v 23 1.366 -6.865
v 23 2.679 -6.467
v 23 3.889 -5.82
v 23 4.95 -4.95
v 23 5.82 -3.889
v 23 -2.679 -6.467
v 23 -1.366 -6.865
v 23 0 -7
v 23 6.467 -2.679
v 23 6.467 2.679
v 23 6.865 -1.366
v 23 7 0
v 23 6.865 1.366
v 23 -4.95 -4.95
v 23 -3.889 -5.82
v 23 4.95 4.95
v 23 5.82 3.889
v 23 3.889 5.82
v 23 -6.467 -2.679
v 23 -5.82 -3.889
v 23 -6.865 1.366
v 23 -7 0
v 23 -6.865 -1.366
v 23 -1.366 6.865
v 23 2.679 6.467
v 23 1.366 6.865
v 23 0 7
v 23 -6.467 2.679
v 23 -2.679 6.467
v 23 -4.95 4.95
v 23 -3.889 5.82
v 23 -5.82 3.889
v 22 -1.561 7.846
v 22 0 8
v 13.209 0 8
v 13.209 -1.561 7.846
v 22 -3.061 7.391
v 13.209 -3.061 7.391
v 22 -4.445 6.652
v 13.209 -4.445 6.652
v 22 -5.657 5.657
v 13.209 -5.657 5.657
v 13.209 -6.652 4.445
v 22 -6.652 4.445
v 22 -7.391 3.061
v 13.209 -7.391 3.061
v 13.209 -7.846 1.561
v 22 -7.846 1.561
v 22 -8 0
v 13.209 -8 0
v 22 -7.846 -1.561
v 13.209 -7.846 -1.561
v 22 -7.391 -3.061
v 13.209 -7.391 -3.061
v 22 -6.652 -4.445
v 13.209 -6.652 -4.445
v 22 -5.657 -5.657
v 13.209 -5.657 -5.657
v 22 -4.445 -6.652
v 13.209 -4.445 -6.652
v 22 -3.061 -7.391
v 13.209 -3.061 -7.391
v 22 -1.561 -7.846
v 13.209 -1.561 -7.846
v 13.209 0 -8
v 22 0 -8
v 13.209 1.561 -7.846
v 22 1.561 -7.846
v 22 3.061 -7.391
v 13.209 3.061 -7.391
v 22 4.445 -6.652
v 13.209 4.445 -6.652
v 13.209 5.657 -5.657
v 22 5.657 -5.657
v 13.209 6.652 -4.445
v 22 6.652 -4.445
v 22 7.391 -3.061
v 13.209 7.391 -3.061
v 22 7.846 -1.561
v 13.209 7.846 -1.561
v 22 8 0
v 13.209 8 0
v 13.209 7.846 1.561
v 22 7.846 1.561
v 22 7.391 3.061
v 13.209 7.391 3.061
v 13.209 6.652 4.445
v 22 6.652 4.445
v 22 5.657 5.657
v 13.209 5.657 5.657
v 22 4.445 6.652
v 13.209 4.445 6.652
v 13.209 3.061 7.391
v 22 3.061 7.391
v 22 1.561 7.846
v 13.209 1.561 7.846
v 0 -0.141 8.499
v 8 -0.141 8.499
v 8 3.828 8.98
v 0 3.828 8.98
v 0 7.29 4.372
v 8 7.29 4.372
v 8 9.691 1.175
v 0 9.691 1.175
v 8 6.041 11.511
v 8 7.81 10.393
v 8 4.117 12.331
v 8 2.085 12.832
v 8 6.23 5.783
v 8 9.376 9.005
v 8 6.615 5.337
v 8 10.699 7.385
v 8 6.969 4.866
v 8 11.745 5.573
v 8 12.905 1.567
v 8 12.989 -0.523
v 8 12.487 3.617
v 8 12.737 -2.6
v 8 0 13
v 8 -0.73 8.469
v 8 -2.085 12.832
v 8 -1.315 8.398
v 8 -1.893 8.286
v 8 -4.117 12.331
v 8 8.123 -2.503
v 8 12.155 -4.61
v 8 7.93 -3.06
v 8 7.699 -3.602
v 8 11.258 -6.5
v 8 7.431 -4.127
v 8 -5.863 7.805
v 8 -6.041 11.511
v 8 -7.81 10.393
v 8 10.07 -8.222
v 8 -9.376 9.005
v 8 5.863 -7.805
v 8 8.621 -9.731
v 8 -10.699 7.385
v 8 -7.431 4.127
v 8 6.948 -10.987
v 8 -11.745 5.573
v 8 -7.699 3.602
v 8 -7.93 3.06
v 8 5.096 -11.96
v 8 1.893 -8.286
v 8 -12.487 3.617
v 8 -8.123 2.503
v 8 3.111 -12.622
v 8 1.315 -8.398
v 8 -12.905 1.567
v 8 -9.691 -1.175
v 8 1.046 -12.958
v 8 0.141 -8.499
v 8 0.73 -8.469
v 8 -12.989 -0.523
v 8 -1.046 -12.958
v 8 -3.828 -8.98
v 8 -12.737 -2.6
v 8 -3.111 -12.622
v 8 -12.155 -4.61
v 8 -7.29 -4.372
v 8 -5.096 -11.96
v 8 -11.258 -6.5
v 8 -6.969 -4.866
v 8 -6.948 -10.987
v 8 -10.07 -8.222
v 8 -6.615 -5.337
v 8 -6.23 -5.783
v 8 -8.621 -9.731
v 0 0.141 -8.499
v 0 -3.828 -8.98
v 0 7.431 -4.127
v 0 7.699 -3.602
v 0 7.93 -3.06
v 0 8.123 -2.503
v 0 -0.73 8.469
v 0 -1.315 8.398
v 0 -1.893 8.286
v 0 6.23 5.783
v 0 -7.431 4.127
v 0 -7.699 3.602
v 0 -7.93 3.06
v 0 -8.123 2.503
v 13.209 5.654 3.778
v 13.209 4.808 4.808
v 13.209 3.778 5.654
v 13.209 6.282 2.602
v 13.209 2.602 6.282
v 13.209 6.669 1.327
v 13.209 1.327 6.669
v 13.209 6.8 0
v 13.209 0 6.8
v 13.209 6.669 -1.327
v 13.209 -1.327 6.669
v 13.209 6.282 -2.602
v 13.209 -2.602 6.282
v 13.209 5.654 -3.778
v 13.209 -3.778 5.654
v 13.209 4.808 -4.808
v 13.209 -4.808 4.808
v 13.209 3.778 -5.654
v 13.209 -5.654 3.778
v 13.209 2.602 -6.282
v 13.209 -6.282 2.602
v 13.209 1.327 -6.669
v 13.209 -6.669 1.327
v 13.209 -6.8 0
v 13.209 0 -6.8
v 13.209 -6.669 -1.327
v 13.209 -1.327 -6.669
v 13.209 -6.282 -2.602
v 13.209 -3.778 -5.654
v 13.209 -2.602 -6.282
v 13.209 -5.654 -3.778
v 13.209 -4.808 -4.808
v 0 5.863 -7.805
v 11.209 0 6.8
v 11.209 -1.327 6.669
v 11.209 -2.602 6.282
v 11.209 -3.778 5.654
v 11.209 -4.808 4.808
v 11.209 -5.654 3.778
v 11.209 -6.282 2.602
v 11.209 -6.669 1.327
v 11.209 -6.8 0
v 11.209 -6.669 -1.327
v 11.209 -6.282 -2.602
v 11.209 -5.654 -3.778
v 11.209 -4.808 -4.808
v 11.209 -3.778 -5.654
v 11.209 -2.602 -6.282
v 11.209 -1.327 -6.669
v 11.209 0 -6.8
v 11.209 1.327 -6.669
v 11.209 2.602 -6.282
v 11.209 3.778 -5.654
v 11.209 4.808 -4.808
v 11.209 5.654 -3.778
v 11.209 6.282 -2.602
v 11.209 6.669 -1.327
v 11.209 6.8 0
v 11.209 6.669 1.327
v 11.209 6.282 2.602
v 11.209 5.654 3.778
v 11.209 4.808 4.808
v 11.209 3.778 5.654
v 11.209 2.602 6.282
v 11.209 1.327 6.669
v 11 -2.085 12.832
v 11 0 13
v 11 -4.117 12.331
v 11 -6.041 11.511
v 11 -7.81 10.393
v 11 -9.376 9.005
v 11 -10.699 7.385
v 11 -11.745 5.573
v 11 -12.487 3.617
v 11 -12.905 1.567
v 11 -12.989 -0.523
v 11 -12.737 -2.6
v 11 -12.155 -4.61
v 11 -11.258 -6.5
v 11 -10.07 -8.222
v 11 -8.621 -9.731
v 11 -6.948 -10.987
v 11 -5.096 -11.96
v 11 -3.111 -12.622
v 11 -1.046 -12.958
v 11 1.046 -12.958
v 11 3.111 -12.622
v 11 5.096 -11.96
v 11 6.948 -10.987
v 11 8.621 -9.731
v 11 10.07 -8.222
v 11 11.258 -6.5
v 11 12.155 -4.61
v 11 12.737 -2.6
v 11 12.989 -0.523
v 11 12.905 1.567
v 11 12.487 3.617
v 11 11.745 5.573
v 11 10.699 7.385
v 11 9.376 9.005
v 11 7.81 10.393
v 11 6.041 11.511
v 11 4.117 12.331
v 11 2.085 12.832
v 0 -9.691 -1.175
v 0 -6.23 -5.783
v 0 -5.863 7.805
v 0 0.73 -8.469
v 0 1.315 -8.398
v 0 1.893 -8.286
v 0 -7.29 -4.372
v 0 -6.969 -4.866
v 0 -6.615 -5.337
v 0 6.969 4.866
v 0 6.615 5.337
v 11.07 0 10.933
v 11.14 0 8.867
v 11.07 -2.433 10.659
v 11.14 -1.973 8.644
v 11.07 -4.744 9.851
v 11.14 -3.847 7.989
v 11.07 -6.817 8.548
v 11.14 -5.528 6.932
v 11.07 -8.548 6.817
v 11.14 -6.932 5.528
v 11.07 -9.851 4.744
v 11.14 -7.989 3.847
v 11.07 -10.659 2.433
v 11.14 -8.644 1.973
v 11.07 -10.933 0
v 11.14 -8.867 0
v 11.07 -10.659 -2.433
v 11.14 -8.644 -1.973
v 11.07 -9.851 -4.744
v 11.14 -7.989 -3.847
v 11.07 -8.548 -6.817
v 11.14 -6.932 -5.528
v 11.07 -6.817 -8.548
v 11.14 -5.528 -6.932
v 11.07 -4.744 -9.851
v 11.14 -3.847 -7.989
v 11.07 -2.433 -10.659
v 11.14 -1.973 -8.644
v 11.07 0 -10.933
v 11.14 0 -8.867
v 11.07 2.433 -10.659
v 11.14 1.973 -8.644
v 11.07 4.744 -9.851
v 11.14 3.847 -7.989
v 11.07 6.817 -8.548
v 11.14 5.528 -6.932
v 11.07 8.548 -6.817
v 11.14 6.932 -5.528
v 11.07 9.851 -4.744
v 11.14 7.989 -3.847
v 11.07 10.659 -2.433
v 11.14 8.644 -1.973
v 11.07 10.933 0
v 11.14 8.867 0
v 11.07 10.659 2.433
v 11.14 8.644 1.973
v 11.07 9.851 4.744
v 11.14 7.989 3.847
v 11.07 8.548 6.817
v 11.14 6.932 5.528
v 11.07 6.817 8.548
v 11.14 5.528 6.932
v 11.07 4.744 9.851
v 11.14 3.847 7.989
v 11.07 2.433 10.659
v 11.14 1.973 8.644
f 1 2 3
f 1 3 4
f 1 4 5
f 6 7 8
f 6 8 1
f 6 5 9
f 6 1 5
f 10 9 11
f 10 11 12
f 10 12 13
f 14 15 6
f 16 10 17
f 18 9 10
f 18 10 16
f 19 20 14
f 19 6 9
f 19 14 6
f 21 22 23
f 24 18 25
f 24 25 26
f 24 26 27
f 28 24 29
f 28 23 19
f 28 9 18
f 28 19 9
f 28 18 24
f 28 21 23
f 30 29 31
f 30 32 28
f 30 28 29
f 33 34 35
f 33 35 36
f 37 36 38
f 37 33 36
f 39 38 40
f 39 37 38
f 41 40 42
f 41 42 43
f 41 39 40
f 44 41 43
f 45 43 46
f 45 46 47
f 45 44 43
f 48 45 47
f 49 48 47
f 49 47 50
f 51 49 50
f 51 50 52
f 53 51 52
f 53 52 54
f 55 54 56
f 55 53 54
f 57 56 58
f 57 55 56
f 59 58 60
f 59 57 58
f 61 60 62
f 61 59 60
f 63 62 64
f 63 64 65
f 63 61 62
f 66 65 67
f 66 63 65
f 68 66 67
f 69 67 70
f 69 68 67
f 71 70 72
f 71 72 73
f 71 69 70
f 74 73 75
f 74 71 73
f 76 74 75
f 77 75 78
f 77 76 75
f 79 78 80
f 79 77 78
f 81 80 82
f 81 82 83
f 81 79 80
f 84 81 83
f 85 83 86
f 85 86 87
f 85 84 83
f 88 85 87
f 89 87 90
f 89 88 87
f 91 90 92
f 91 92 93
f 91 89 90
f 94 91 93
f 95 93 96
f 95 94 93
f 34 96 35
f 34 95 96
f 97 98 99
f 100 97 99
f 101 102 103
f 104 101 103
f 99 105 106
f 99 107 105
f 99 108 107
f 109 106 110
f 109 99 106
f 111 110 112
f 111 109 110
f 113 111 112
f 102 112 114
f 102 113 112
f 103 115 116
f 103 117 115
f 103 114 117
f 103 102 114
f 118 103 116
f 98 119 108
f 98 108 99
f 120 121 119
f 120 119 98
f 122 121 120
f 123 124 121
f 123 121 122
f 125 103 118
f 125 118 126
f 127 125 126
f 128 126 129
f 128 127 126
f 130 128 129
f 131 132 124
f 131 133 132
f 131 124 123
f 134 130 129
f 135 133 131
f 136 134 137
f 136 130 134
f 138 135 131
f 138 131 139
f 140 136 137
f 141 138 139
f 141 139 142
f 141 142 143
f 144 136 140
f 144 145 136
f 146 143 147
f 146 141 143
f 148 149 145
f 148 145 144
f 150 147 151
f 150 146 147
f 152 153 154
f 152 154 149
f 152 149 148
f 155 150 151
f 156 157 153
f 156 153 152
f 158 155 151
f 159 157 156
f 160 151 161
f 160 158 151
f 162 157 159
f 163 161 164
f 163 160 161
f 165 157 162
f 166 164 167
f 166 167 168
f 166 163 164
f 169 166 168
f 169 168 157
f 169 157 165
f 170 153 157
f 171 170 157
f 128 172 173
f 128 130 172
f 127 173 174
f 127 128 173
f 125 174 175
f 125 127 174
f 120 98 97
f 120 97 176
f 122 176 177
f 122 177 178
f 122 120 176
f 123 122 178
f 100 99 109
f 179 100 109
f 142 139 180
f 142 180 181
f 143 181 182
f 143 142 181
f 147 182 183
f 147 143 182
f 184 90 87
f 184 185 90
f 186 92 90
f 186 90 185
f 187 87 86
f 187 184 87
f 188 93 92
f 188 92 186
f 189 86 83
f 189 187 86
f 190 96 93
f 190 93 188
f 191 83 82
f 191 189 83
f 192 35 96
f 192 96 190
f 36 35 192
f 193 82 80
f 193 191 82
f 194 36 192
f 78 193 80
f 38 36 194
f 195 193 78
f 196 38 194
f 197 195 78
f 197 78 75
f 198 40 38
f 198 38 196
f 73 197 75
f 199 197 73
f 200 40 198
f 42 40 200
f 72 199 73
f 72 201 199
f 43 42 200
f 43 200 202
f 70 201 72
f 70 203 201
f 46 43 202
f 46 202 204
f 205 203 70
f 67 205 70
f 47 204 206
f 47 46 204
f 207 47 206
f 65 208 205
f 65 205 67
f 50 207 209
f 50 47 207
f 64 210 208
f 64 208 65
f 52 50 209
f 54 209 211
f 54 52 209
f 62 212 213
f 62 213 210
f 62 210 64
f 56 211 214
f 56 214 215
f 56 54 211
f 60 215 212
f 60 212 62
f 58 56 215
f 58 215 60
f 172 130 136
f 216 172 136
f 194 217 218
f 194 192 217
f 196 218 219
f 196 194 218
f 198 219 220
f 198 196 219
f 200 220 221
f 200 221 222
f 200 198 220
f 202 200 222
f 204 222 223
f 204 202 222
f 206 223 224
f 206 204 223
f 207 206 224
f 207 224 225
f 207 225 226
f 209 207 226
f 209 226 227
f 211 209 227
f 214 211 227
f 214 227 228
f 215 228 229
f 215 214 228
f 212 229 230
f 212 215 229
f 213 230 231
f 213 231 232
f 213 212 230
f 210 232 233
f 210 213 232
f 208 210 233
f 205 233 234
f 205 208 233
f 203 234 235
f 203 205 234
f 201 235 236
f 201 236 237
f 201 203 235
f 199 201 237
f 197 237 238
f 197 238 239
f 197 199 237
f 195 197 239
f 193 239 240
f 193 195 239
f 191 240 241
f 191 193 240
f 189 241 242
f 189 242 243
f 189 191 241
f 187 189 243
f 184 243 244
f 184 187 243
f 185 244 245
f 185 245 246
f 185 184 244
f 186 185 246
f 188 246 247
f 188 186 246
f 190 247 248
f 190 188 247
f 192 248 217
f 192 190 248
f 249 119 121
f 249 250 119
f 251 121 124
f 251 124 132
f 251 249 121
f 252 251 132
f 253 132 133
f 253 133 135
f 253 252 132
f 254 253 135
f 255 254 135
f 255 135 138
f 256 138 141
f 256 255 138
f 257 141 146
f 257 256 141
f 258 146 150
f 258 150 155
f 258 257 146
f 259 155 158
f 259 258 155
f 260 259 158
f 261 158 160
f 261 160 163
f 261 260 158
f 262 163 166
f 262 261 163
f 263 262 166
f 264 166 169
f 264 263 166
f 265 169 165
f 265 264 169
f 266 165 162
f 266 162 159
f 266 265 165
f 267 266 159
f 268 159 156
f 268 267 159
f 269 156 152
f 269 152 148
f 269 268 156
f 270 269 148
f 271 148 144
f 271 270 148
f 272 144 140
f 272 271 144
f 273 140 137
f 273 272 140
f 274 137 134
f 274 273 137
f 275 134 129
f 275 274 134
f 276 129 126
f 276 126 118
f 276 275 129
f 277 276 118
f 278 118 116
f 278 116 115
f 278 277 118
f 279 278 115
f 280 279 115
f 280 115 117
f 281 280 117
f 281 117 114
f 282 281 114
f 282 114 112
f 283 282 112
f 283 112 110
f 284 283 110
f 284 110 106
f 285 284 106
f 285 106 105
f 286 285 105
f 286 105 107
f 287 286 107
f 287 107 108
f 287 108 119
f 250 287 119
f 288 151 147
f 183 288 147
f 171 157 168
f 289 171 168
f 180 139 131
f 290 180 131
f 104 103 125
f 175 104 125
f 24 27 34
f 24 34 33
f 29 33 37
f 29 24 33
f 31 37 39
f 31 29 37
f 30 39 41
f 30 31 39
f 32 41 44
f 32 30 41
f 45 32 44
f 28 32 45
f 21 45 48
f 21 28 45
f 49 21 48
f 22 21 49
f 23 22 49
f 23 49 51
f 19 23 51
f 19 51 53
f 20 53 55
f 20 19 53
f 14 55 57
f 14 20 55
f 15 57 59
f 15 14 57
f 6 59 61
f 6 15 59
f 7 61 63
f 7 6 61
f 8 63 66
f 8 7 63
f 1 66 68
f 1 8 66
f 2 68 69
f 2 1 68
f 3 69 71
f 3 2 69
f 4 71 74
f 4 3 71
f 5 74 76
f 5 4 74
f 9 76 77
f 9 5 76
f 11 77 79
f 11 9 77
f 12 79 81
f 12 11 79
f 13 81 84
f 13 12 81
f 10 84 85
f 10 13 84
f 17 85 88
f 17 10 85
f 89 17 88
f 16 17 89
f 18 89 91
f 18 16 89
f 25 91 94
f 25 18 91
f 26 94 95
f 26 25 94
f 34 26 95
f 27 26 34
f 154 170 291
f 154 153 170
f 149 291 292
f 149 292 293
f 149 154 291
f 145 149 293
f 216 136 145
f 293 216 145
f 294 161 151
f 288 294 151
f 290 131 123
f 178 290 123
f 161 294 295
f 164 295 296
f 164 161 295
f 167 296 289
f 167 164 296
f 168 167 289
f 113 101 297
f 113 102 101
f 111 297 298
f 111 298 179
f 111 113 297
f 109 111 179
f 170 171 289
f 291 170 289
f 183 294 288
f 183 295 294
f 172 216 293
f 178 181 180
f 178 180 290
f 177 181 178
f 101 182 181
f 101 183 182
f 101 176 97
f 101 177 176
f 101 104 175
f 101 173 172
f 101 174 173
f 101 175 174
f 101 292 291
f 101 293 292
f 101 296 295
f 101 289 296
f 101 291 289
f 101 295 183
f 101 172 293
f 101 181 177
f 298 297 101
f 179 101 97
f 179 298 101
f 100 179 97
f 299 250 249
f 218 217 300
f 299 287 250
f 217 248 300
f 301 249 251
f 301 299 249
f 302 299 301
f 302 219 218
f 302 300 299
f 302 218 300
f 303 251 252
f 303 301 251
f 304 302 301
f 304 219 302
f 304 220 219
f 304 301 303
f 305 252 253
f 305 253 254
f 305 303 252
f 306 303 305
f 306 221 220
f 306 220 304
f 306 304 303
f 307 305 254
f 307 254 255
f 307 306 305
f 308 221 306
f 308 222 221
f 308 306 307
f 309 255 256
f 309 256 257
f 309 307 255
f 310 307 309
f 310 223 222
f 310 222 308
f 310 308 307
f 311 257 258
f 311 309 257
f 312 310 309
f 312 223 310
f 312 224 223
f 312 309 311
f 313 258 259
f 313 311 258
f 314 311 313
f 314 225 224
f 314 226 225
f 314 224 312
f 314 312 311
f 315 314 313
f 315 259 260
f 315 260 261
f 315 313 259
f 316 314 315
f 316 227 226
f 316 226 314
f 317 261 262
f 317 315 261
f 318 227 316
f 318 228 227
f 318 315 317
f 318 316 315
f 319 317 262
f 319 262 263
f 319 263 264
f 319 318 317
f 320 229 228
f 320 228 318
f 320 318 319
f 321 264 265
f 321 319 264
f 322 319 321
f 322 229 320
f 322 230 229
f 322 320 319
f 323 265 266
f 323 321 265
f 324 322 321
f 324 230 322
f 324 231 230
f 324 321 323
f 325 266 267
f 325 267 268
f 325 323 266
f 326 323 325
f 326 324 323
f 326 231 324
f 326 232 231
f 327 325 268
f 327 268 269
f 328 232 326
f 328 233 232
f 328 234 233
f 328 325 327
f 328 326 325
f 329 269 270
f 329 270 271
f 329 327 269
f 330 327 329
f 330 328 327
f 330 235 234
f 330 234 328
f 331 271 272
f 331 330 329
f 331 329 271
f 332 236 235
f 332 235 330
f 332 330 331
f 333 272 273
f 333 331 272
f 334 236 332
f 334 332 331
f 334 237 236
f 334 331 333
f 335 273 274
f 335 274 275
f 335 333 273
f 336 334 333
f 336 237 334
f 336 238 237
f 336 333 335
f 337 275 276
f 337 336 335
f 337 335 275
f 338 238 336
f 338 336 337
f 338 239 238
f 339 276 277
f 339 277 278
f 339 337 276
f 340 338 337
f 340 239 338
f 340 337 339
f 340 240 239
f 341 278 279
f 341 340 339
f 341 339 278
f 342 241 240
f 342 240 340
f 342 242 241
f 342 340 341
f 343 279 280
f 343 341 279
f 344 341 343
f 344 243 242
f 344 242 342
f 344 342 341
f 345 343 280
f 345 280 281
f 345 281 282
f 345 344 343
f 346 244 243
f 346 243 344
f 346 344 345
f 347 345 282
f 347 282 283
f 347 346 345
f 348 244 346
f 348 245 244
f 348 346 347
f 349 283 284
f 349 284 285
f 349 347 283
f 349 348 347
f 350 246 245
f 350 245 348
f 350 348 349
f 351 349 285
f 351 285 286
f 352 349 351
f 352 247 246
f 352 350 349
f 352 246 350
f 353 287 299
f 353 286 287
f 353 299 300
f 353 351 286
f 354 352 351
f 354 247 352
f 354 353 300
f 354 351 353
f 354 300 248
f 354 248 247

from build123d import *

# Parameters (mm, degrees)
EXTRUDE_START   = -8
SKETCH_2_R      = 8.5
EXTRUDE_1_DEPTH = 8
CHAMFER_1_SIZE  = 1


with BuildPart() as part:
    # Sketch 1 → 旋转1 (revolve)
    with BuildSketch(Plane.XY, mode=Mode.PRIVATE) as revolve_1_sk:
        Polygon((0, 0), (0, 8.5), (8, 8.5), (8, 13), (11, 13), (11.209265355, 6.8), (13.209265355, 6.8), (13.209265355, 8), (23, 8), (23, 0), align=None)
    revolve(revolve_1_sk.sketch.rotate(Axis((0, 0, 0), (1, 0, 0)), 90), axis=Axis((0, 0, 0), (1, 0, 0)))

    # 草图2 → 凸台-拉伸1 (add)
    # profile 1 of 7: a face of its own
    with BuildSketch(Plane.ZY.offset(EXTRUDE_START)):
        Polygon((-1.174764966, -9.690972033), (7.805245485, -5.86286232), (8.980010451, 3.828109713), (1.174764966, 9.690972033), (-7.805245485, 5.86286232), (-8.980010451, -3.828109713), align=None)
        Circle(SKETCH_2_R, mode=Mode.SUBTRACT)
    # profile 2 of 7: a face of its own
    with BuildSketch(Plane.ZY.offset(EXTRUDE_START)):
        with BuildLine():
            Line((-7.805245485, 5.86286232), (-8.286430908, 1.893426207))
            ThreePointArc((-8.286430908, 1.893426207), (-6.796266629, 5.104974035), (-4.12702026, 7.430861577))
            Line((-4.12702026, 7.430861577), (-7.805245485, 5.86286232))
        make_face()
    # profile 3 of 7: a face of its own
    with BuildSketch(Plane.ZY.offset(EXTRUDE_START)):
        with BuildLine():
            ThreePointArc((-2.503460259, 8.122972777), (1.022903886, 8.43822657), (4.371804767, 7.289535176))
            Line((4.371804767, 7.289535176), (1.174764966, 9.690972033))
            Line((1.174764966, 9.690972033), (-2.503460259, 8.122972777))
        make_face()
    # profile 4 of 7: a face of its own
    with BuildSketch(Plane.ZY.offset(EXTRUDE_START)):
        with BuildLine():
            ThreePointArc((8.5, 0), (8.499706252, -0.070665642), (8.498825028, -0.141326401))
            Line((8.498825028, -0.141326401), (8.980010451, 3.828109713))
            Line((8.980010451, 3.828109713), (5.78297065, 6.22954657))
            ThreePointArc((5.78297065, 6.22954657), (7.79118895, 3.398142837), (8.5, 0))
        make_face()
    # profile 5 of 7: a face of its own
    with BuildSketch(Plane.ZY.offset(EXTRUDE_START)):
        with BuildLine():
            Line((4.12702026, -7.430861577), (7.805245485, -5.86286232))
            Line((7.805245485, -5.86286232), (8.286430908, -1.893426207))
            ThreePointArc((8.286430908, -1.893426207), (6.796266629, -5.104974035), (4.12702026, -7.430861577))
        make_face()
    # profile 6 of 7: a face of its own
    with BuildSketch(Plane.ZY.offset(EXTRUDE_START)):
        with BuildLine():
            Line((-1.174764966, -9.690972033), (2.503460259, -8.122972777))
            ThreePointArc((2.503460259, -8.122972777), (-1.022903886, -8.43822657), (-4.371804767, -7.289535176))
            Line((-4.371804767, -7.289535176), (-1.174764966, -9.690972033))
        make_face()
    # profile 7 of 7: a face of its own
    with BuildSketch(Plane.ZY.offset(EXTRUDE_START)):
        with BuildLine():
            Line((-8.980010451, -3.828109713), (-5.78297065, -6.22954657))
            ThreePointArc((-5.78297065, -6.22954657), (-7.819170515, -3.333252534), (-8.498825028, 0.141326401))
            Line((-8.498825028, 0.141326401), (-8.980010451, -3.828109713))
        make_face()
    extrude(amount=EXTRUDE_1_DEPTH)

    # 倒角1
    chamfer_1_edges = [part.edges().sort_by_distance(p)[0] for p in [
        (23, 0, -8),
    ]]
    chamfer(chamfer_1_edges, length=CHAMFER_1_SIZE)


solid = part.part
